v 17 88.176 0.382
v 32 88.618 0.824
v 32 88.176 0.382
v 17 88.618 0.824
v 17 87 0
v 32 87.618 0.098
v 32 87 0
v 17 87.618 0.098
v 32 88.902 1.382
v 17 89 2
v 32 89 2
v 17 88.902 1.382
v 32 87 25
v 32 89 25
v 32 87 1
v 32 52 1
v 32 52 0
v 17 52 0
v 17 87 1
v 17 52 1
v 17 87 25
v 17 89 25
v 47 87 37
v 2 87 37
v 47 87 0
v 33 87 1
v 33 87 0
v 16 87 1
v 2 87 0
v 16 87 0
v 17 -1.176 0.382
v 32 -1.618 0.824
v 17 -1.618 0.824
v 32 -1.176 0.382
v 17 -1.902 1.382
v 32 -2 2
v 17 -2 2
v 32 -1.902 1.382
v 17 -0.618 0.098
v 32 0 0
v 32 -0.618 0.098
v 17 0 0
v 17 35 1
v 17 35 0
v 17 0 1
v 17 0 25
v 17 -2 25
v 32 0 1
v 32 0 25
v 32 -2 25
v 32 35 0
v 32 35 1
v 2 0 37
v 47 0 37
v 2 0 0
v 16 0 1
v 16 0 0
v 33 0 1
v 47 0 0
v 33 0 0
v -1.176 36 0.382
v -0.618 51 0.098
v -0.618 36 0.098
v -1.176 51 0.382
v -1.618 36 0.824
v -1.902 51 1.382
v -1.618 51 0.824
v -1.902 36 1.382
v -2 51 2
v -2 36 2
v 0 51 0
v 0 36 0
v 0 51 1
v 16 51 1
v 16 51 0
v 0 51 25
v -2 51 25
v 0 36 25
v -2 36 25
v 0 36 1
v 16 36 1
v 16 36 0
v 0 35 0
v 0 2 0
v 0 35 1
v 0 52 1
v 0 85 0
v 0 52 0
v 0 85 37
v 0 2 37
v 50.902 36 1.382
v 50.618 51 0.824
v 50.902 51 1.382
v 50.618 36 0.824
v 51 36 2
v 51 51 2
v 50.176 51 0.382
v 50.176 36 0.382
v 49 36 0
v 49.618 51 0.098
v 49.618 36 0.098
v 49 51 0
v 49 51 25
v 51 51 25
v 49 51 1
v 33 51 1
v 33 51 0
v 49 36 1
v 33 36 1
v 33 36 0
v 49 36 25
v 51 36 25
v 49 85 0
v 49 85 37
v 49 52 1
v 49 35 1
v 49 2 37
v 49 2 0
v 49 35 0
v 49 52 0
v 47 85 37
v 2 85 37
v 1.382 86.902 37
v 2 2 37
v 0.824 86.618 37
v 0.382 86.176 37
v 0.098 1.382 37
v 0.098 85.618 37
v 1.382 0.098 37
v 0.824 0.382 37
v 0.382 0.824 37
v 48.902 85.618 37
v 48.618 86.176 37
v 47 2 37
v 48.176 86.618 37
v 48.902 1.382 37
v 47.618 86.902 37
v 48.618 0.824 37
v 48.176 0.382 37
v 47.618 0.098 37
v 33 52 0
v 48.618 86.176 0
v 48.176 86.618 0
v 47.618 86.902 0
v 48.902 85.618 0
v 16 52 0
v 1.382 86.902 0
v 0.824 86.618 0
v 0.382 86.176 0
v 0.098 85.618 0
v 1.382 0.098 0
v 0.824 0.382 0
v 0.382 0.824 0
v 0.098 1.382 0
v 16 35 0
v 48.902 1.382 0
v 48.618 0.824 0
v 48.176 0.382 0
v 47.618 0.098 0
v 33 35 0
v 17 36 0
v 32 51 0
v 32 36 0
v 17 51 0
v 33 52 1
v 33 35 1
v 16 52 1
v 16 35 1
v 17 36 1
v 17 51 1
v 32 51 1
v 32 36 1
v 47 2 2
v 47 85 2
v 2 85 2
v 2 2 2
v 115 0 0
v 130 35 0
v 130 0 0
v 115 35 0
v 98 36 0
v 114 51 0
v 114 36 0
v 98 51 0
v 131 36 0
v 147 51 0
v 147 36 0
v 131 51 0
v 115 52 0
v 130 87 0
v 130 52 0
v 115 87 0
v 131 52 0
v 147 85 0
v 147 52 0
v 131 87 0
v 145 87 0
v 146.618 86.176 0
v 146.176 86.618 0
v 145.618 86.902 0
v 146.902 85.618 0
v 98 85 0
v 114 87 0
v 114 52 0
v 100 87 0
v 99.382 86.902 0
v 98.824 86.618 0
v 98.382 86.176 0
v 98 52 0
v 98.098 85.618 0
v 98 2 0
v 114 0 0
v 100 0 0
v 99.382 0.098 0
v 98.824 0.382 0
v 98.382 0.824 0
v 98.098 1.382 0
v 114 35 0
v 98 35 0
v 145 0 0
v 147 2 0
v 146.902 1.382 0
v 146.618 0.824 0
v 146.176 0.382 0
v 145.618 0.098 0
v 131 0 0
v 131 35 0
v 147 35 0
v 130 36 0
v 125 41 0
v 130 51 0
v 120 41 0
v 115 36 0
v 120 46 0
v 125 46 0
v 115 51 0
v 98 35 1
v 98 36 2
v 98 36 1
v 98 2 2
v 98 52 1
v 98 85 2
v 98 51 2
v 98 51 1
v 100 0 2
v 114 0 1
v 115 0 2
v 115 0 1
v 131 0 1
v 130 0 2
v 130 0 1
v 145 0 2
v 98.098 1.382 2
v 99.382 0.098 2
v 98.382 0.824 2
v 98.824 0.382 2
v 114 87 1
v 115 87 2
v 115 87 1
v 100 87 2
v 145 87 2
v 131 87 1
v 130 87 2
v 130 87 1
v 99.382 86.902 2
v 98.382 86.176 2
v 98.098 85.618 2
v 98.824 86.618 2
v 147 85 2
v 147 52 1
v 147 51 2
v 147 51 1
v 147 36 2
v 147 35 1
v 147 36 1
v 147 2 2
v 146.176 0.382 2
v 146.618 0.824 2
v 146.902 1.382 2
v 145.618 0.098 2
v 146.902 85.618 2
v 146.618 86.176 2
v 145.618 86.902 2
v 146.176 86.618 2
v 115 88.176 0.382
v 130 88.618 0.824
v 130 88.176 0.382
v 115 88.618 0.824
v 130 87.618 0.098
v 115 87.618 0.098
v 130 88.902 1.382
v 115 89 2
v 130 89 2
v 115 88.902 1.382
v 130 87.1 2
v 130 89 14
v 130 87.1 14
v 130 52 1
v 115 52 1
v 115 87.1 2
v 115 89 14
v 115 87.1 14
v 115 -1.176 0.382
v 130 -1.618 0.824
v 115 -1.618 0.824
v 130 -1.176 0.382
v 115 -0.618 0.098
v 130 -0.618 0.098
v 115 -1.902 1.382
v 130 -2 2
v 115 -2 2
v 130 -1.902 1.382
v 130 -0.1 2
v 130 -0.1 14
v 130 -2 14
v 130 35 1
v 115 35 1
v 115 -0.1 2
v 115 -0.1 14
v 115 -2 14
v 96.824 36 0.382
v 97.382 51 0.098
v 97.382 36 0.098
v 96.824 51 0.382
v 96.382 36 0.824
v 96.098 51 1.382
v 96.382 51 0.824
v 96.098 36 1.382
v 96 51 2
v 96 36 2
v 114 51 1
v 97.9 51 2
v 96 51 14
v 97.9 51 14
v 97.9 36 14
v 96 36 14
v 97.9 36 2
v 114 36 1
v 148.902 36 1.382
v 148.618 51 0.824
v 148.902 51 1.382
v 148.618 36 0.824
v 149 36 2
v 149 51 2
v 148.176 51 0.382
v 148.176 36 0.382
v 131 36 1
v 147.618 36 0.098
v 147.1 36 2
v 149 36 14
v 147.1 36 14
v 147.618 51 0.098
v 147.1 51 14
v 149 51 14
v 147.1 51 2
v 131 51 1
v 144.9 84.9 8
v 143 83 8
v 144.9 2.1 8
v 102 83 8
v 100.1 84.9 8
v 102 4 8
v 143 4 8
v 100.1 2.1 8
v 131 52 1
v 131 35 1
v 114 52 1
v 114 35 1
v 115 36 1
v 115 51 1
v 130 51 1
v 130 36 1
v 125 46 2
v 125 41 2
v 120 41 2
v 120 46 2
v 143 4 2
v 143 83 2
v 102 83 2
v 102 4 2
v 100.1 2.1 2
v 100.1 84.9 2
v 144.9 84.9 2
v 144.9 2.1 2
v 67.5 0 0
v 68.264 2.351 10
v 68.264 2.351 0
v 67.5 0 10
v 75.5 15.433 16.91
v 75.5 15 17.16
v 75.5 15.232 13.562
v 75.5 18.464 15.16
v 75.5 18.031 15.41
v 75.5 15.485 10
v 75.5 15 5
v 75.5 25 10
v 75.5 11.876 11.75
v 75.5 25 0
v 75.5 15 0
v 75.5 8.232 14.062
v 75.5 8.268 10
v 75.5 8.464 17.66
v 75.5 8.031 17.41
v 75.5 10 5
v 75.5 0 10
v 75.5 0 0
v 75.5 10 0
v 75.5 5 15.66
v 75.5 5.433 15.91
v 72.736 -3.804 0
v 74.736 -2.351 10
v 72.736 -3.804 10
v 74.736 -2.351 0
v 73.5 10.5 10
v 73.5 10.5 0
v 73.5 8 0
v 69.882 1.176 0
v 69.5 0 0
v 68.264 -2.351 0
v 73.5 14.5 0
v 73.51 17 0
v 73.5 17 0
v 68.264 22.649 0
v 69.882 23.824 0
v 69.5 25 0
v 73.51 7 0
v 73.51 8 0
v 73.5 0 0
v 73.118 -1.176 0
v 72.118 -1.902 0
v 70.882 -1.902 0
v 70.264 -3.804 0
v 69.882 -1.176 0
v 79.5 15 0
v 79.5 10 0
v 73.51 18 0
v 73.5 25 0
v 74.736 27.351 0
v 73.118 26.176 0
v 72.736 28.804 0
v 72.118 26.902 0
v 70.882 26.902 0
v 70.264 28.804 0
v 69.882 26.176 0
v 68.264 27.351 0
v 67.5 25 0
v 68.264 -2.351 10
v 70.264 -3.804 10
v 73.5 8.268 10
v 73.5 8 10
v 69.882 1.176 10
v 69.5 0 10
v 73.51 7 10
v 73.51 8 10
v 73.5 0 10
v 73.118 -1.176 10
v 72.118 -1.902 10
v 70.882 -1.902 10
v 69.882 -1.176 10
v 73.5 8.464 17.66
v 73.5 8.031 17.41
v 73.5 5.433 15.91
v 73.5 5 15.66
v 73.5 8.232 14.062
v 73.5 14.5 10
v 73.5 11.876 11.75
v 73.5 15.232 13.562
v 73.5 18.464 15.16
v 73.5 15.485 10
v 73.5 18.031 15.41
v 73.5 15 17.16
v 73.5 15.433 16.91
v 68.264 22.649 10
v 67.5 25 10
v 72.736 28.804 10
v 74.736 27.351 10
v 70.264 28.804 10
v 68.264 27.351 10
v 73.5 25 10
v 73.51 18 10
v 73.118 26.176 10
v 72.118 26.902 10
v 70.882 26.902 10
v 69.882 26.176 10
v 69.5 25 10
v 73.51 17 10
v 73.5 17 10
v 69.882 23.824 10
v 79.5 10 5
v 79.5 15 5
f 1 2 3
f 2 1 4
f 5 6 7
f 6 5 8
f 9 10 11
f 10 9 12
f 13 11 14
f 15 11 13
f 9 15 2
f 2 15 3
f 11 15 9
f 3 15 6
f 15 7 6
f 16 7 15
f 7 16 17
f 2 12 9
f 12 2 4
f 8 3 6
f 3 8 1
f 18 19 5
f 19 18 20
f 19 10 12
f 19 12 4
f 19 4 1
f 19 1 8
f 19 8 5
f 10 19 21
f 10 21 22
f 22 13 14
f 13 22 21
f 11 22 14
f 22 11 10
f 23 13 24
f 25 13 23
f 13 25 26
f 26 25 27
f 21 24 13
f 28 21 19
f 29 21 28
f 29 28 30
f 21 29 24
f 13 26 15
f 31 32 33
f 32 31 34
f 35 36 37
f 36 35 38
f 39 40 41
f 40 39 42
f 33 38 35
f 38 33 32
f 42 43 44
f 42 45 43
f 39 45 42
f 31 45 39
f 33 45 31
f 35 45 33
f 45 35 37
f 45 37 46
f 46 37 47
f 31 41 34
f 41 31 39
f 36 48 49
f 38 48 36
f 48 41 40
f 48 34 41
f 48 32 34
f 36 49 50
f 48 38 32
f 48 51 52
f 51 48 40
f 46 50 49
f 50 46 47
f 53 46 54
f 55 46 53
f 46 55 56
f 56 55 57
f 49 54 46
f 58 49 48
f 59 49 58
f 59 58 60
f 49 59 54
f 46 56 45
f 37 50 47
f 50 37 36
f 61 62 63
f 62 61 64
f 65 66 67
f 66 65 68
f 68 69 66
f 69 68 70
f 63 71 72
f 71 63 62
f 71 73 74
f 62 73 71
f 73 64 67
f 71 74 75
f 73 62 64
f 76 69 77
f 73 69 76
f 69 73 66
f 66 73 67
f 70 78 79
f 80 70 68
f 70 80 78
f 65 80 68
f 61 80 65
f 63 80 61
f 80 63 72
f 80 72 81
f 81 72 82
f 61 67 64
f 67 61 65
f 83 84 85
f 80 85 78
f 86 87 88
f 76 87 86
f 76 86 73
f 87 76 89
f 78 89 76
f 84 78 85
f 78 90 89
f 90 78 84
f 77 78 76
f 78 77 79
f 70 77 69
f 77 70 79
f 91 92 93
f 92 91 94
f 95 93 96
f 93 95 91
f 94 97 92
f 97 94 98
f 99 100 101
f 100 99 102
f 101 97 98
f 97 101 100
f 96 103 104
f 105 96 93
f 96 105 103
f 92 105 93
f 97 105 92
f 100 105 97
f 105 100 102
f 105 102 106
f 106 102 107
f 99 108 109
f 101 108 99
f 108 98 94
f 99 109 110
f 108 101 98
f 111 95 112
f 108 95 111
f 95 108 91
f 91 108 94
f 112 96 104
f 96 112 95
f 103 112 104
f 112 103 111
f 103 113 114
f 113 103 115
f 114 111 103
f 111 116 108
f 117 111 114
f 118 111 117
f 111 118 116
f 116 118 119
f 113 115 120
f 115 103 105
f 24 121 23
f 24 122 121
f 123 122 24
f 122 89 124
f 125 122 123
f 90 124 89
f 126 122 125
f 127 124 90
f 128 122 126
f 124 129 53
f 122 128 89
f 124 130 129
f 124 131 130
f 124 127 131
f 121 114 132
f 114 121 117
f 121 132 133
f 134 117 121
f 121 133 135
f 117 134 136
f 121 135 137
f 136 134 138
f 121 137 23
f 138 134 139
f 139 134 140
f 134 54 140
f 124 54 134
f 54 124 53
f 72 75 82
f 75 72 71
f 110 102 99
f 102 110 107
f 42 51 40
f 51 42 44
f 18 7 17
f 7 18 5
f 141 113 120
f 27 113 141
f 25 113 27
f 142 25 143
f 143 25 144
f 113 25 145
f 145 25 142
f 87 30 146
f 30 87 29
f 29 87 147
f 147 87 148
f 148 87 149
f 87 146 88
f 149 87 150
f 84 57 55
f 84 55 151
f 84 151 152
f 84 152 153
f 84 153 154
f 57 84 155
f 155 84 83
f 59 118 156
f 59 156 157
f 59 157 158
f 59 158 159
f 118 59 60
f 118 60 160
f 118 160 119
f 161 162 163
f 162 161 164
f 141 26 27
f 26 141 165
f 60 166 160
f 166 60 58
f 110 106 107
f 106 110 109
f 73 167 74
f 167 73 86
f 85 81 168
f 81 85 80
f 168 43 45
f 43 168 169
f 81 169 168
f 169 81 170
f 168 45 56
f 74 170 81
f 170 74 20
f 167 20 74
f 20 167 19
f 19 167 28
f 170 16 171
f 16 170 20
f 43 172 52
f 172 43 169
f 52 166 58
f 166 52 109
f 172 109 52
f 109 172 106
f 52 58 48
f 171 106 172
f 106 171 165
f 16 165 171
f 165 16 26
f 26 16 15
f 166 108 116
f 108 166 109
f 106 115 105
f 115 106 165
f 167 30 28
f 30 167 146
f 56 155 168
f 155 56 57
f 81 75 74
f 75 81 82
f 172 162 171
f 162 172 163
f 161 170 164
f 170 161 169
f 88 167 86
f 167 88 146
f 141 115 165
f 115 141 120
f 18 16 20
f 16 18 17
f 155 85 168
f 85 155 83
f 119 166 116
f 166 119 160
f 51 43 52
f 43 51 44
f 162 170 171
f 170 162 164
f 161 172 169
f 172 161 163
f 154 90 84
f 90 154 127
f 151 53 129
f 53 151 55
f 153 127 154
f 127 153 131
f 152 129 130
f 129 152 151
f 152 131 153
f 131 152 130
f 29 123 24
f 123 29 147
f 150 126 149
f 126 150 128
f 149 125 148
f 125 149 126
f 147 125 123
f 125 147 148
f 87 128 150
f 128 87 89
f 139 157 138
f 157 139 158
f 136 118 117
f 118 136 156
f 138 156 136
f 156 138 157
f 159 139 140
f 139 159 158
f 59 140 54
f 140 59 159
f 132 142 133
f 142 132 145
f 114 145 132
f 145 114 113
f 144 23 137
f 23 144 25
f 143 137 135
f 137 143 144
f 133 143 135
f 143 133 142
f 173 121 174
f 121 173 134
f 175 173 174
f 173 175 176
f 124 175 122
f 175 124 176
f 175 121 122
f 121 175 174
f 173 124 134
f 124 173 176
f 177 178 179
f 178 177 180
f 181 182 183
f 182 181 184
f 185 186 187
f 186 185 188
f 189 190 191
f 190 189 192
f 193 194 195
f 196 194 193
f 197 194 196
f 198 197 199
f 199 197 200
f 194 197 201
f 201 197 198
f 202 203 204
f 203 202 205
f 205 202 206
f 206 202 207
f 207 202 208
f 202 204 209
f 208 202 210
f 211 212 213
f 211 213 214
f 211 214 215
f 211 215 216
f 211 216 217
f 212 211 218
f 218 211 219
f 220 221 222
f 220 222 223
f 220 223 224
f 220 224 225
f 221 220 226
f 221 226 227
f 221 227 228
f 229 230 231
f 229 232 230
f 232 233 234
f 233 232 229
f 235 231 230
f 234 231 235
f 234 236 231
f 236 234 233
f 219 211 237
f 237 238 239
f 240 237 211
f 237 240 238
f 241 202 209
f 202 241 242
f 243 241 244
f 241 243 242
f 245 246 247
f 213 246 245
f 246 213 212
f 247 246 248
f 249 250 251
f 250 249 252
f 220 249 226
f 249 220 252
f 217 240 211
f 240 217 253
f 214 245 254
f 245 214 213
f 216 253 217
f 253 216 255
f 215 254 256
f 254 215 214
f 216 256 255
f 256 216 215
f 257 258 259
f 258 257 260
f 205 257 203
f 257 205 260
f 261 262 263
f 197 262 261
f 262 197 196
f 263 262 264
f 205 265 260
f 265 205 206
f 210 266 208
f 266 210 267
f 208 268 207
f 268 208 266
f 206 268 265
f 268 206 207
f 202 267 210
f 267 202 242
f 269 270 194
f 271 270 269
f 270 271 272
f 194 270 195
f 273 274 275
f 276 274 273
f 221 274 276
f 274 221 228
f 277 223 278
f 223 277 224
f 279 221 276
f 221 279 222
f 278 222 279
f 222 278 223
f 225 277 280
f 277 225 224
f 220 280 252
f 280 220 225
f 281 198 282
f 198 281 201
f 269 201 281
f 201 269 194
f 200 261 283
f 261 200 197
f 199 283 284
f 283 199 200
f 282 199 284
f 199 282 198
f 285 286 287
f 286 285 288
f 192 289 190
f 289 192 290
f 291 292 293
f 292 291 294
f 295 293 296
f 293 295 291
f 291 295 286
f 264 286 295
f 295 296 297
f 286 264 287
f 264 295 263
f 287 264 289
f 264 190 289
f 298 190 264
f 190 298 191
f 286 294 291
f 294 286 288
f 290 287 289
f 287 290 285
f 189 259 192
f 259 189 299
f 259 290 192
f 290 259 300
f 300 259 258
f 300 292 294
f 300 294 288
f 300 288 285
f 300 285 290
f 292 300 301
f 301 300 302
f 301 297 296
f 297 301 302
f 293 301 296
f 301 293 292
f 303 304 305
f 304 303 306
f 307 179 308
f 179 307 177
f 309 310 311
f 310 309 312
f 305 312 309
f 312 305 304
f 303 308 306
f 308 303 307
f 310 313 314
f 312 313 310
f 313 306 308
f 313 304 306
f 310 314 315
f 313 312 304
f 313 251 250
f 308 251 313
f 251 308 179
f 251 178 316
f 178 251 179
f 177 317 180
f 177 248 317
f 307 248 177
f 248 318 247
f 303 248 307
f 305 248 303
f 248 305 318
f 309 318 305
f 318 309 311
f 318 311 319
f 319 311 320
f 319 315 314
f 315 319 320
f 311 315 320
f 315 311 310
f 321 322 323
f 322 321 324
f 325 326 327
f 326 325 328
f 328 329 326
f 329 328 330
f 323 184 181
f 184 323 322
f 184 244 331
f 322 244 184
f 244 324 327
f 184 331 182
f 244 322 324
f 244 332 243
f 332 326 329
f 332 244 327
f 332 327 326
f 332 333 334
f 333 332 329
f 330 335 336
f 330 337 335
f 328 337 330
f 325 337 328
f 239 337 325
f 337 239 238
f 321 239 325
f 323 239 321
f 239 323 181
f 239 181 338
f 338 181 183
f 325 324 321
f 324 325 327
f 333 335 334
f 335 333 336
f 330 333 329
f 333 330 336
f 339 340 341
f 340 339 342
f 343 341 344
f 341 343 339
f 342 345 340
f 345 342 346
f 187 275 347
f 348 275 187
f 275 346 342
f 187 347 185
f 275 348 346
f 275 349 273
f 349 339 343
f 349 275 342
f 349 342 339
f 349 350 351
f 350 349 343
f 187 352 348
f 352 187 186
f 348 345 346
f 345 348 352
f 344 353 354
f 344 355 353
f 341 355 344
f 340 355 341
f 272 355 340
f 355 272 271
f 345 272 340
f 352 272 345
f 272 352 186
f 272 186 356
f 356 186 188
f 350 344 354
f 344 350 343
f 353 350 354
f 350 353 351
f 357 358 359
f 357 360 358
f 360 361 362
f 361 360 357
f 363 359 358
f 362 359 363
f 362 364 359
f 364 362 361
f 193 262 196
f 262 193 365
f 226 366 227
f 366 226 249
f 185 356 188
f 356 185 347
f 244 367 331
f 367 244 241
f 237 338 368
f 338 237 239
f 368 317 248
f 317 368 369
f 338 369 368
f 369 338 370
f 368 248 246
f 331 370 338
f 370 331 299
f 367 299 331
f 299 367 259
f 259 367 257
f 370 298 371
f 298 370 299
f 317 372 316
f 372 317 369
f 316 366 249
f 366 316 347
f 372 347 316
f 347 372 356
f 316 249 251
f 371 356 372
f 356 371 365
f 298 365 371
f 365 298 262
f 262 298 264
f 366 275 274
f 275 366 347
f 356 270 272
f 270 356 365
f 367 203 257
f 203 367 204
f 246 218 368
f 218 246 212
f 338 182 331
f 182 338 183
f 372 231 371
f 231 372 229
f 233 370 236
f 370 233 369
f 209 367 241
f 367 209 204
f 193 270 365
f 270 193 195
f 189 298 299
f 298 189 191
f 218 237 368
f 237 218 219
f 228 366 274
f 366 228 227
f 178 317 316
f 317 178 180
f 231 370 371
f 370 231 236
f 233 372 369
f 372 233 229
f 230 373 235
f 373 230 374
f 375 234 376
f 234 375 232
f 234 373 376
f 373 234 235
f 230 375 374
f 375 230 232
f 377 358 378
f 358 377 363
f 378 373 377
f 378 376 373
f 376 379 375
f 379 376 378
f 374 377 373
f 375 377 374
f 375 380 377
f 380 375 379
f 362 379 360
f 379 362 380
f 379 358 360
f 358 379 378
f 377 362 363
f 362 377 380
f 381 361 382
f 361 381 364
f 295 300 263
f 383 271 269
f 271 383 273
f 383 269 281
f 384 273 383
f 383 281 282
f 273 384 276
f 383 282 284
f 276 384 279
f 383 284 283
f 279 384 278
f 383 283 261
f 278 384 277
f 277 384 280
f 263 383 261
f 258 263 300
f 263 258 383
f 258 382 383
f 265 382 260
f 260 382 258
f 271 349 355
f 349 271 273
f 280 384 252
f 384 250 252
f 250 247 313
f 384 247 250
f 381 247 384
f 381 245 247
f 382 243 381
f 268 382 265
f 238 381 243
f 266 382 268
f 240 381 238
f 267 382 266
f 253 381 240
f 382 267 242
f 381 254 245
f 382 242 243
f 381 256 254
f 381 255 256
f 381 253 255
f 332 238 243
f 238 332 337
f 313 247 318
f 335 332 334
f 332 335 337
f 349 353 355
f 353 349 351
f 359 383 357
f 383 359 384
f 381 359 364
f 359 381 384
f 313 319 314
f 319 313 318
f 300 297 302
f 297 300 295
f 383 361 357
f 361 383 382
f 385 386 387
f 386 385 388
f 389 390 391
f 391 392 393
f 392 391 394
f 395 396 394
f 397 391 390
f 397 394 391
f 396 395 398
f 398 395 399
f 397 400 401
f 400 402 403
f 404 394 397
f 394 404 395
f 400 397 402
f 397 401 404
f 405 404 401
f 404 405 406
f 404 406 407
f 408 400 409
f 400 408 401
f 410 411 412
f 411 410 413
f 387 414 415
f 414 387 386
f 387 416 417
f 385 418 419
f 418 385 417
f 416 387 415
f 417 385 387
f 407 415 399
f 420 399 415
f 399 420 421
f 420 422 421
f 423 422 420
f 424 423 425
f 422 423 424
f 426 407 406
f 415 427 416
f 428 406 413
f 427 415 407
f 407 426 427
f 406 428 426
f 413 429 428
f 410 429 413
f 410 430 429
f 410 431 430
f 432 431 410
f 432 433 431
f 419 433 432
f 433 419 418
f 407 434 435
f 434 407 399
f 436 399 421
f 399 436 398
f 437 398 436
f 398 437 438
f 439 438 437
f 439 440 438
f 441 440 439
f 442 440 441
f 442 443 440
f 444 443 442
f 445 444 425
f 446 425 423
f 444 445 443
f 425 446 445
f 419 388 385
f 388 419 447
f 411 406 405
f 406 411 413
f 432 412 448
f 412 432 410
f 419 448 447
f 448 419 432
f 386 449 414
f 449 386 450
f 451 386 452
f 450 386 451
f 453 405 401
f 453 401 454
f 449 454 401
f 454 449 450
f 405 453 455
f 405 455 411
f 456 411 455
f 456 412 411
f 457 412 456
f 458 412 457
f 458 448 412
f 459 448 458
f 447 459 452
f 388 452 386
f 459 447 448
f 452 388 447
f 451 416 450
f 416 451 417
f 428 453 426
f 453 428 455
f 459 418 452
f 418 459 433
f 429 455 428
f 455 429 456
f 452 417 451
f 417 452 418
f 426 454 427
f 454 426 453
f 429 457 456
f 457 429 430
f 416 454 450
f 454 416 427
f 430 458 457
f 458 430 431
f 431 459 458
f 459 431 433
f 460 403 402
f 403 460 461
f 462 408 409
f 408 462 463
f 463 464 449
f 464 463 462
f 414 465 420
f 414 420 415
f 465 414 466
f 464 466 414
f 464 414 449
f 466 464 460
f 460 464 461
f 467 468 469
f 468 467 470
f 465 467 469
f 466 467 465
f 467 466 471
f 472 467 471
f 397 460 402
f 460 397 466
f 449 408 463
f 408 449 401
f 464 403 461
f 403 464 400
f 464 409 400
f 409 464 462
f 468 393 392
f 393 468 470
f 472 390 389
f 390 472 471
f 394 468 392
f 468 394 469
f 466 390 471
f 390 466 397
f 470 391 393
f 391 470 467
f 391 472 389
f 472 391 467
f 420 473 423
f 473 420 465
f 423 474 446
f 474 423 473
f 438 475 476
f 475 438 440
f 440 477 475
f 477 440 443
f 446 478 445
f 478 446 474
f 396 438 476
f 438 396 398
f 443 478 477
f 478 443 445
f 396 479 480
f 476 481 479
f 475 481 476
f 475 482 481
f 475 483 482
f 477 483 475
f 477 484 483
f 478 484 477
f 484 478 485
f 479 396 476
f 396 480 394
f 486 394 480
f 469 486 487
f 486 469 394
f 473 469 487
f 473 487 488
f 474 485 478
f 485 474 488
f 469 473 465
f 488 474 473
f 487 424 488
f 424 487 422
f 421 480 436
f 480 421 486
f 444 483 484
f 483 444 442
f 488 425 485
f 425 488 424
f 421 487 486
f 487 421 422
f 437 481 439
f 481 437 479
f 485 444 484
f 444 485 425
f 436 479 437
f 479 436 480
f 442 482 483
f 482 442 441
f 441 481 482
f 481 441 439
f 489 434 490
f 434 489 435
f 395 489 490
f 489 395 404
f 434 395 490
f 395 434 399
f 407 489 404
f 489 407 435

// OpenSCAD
// This controls how tight the lid will fit to the base. .2 is the default, which is right for my printer; but you might need a higher number (for a looser fit) or a lower number (for a tighter fit).
lid_tolerance = .2;

// The *inner* length of the box base in millimeters. The *overall* length is `length + wall * 2`.
length=83;

// The *inner* width of the box base in millimeters. The *overall* width is `width + wall * 2`.
width=45;

// The *inner* height of the box base in millimeters. The *overall* height, not counting ribbon, is `height + wall * 2`. Note that the usable inner volume is decreased due to the lid inset. The lid inset is equal to wall*3.
height=35;

// The thickness of all walls, in millimeters.
wall=2;

// The amount the top-box-ribbon descends down the sides, in millimeters.
ribbon_overlap=10;

/* [Hidden] */
draw_bottom=1; draw_ribbon=1; draw_top=1; 

ribbon=(width>length?length/3:width/3);
assembled=0;

if( draw_bottom ) {
difference() {
	union() {
		translate( [(width+wall*2-ribbon)/2,length+wall*2,wall] ) {
			rotate( [0,90,0] ) cylinder( r=wall, h=ribbon, $fn=20 );
			cube( [ribbon,wall,height-wall-ribbon_overlap] );
		}
		translate( [(width+wall*2-ribbon)/2,0,wall] ) {
			rotate( [0,90,0] ) cylinder( r=wall, h=ribbon, $fn=20 );
			translate( [0,-wall,0] ) cube( [ribbon,wall,height-wall-ribbon_overlap] );
		}
		translate( [0,(length+wall*2-ribbon)/2,wall] ) {
			rotate( [-90,0,0] ) cylinder( r=wall, h=ribbon, $fn=20 );
			translate( [-wall,0,0] ) cube( [wall,ribbon,height-wall-ribbon_overlap] );
		}
		translate( [width+wall*2,(length+wall*2-ribbon)/2,wall] ) {
			rotate( [-90,0,0] ) cylinder( r=wall, h=ribbon, $fn=20 );
			cube( [wall,ribbon,height-wall-ribbon_overlap] );
		}
		cube( [width+wall*2,length+wall*2,height+wall] );
	}
	translate( [wall,wall,wall] ) cube( [width,length,height+.01] );
	translate( [width/2+wall,length/2+wall,0] ) {
		for( theta=[0,90,180,270] ) {
		rotate( [0,0,theta] )
		difference() {
			translate( [-ribbon/2-1,0,0] ) cube( [ribbon+2,length/2+wall,wall/2] );
			translate( [-ribbon/2,0,0] ) cube( [ribbon,length/2+wall,wall/2] );
		}
		}
	}
	for( x=[[0,wall],[width+wall,width+wall]] ) {
		for( y=[[0,wall],[length+wall,length+wall]] ) {
			difference() {
				translate( [x[0],y[0],0] ) cube( [wall,wall,height+wall] );
				translate( [x[1],y[1],0] ) cylinder( r=wall, h=height+wall, $fn=20 );
			}
		}
	}
}
}

if( draw_top ) {
translate( (assembled?[-width*2-wall*4,length+wall+wall,height+wall*2+.05]:[0,0,0]) )
rotate( [(assembled?180:0),0,0] )
translate( [width*2+wall*4,0,0] ) {
difference() {
	union() {
		cube( [width+wall*2,length+wall*2,wall*4] );
		translate( [(width+wall*2-ribbon)/2,length+wall*2,wall] ) {
			rotate( [0,90,0] ) cylinder( r=wall, h=ribbon, $fn=20 );
			cube( [ribbon,wall,wall+ribbon_overlap] );
		}
		translate( [(width+wall*2-ribbon)/2,0,wall] ) {
			rotate( [0,90,0] ) cylinder( r=wall, h=ribbon, $fn=20 );
			translate( [0,-wall,0] ) cube( [ribbon,wall,wall+ribbon_overlap] );
		}
		translate( [0,(length+wall*2-ribbon)/2,wall] ) {
			rotate( [-90,0,0] ) cylinder( r=wall, h=ribbon, $fn=20 );
			translate( [-wall,0,0] ) cube( [wall,ribbon,wall+ribbon_overlap] );
		}
		translate( [width+wall*2,(length+wall*2-ribbon)/2,wall] ) {
			rotate( [-90,0,0] ) cylinder( r=wall, h=ribbon, $fn=20 );
			cube( [wall,ribbon,wall+ribbon_overlap] );
		}
	}

    // Lid inner subtraction
	translate( [wall*2,wall*2,wall] ) cube( [width-wall*2,length-wall*2,wall*4+ribbon_overlap] );

    // Lid outer subtraction, west
	translate( [-lid_tolerance/2,0,wall] ) cube( [wall+lid_tolerance,length+wall*2,wall*4+ribbon_overlap] );
    // Lid outer subtraction, east
	translate( [width+wall-lid_tolerance/2,0,wall] ) cube( [wall+lid_tolerance,length+wall*2,wall*4+ribbon_overlap] );
    // Lid outer subtraction, south
	translate( [0,-lid_tolerance/2,wall] ) cube( [width+wall*2,wall+lid_tolerance,wall*4+ribbon_overlap] );
    // Lid outer subtraction, north
	translate( [0,length+wall-lid_tolerance/2,wall] ) cube( [width+wall*2,wall+lid_tolerance,wall*4+ribbon_overlap] );

	translate( [width/2+wall,length/2+wall,0] ) {
		for( theta=[0,90,180,270] ) {
		rotate( [0,0,theta] )
		difference() {
			translate( [-ribbon/2-1,0,0] ) cube( [ribbon+2,length/2+wall,wall/2] );
			translate( [-ribbon/2,0,0] ) cube( [ribbon,length/2+wall,wall/2] );
		}
		}
		translate( [-2.5,-2.5,0] ) cube( [5,5,5] );
	}

	for( x=[[0,wall],[width+wall,width+wall]] ) {
	for( y=[[0,wall],[length+wall,length+wall]] ) {
		difference() {
			translate( [x[0],y[0],0] ) cube( [wall,wall,height+wall] );
			translate( [x[1],y[1],0] ) cylinder( r=wall, h=height+wall, $fn=20 );
		}
	}}
}
}
}

if( draw_ribbon ) {
translate( (assembled?[-width,0,0]:[0,0,0]) )
rotate( (assembled?[0,90,0]:[0,0,0]) )
translate( [width*1.5+wall*3,0,0] ) {
	difference() {
		hull() {
			translate( [-wall,0,0] ) cylinder( r=wall*2, h=10, $fn=wall*5 );
			translate( [0,9.5,0] ) cube( [wall,1,10] );
		}
		hull() {
			translate( [-wall*1,0,0] ) cylinder( r=wall,h=10,$fn=wall*5 );
			translate( [0,9-wall,0] ) cube( [.01,1,10] );
		}
	}
	translate( [0,10,0] ) cube( [wall*3,5,5] );
	translate( [0,10,0] ) cube( [wall,5,10] );
	translate( [0,10,7] ) rotate( [30,0,0] ) difference() {
		cube( [wall,4,10] );
		translate( [0,2,7] ) scale( [1,1,2] ) rotate( [45,0,0] ) cube( [wall,5,5] );
	}
	translate( [0,10,8.5] ) rotate( [-30,0,0] ) difference() {
		cube( [wall,4,10] );
		translate( [0,2,7] ) scale( [1,1,2] ) rotate( [45,0,0] ) cube( [wall,5,5] );
	}
	difference() {
		hull() {
			translate( [-wall,25,0] ) cylinder( r=wall*2, h=10, $fn=wall*5 );
			translate( [0,14.5,0] ) cube( [wall,1,10] );
		}
		hull() {
			translate( [-wall,25,0] ) cylinder( r=wall, h=10,$fn=wall*5 );
			translate( [0,10+5+wall,0] ) cube( [.01,1,10] );
		}
	}
	
}
}
